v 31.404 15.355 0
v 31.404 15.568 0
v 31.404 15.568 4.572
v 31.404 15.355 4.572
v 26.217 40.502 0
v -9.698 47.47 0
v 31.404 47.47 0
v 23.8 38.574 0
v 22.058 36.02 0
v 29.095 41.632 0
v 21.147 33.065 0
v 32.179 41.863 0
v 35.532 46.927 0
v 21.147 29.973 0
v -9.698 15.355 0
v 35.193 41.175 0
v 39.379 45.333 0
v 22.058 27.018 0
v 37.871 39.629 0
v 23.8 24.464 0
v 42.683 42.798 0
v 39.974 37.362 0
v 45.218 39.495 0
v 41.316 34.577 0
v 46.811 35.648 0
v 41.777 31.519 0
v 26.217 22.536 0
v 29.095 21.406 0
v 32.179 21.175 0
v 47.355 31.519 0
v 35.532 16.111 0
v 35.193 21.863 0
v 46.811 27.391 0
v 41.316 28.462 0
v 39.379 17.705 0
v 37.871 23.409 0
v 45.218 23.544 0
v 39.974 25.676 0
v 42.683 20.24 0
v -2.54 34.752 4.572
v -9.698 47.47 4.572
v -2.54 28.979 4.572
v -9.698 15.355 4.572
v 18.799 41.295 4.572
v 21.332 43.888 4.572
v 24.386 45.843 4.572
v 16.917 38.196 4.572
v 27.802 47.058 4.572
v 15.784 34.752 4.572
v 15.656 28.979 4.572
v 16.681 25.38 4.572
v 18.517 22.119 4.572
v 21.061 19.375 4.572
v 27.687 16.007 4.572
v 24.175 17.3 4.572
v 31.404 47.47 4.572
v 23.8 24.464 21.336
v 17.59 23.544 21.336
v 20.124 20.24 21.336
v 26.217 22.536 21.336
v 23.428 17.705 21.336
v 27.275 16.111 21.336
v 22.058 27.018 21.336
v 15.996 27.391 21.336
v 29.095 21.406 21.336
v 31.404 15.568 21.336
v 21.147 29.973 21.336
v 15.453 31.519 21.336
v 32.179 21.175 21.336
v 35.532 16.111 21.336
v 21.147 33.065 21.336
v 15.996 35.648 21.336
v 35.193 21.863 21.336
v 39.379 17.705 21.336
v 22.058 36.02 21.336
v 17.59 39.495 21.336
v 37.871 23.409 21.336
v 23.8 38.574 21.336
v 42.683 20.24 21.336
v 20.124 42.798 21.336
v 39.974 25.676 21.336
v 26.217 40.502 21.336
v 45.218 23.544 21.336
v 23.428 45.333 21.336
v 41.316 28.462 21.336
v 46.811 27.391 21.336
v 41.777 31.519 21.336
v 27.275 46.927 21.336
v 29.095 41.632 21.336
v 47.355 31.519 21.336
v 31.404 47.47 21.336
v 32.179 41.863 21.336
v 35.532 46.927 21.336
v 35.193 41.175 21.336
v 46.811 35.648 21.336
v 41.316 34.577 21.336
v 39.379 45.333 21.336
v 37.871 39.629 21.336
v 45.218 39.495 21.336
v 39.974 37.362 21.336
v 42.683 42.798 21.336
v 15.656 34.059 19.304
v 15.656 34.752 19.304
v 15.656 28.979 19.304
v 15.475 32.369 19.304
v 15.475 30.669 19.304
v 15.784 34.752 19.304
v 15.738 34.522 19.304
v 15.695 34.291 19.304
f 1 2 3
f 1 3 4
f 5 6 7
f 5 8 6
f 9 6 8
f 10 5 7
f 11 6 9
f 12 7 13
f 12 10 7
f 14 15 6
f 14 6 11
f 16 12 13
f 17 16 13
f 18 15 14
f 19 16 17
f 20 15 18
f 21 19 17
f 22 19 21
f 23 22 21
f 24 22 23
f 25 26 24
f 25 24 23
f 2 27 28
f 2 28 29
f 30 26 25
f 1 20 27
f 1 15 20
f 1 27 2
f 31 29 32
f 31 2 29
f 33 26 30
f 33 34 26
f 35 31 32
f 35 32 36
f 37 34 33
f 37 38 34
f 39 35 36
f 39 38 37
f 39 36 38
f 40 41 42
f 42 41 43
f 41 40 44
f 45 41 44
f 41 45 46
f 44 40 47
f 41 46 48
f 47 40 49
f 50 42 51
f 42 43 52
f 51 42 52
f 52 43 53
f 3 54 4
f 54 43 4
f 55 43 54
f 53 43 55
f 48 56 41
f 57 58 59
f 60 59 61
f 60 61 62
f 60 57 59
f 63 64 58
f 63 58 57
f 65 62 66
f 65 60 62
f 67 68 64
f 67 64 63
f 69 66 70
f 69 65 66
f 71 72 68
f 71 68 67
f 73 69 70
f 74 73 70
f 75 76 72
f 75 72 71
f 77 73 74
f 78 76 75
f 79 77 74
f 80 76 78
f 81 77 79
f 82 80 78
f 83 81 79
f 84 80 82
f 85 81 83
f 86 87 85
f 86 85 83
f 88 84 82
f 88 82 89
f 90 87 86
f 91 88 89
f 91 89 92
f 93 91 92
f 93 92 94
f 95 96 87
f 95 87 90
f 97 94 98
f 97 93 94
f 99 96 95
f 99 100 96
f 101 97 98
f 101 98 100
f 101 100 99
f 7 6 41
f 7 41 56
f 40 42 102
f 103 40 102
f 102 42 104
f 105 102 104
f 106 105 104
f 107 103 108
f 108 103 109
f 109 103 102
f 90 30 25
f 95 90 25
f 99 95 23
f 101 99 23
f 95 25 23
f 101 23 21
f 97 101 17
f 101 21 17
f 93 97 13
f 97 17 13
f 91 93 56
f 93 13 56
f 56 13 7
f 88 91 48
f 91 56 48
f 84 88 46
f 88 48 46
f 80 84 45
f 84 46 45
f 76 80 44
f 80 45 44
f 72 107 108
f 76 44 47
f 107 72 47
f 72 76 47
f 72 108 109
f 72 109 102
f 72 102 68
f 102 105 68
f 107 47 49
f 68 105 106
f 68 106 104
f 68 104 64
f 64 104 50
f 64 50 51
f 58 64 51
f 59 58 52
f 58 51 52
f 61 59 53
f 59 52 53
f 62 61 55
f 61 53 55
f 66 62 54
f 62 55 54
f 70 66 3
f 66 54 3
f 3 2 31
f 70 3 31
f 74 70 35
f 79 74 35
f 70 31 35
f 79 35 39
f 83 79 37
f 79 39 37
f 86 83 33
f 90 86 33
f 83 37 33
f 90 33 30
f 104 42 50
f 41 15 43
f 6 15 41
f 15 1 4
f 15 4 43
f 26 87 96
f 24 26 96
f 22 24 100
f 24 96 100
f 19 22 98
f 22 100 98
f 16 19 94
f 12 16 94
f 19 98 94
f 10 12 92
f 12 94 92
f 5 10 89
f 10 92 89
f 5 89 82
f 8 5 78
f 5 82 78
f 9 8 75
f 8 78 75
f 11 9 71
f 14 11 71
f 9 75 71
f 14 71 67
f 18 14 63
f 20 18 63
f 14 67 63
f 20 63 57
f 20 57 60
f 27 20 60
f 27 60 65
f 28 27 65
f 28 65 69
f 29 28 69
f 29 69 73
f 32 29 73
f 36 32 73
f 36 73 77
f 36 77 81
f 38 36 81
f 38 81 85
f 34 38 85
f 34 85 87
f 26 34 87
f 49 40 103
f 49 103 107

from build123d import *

# Parameters (mm, degrees)
F0_R     = 15.9511244513
F1_DEPTH = 21.336
F4_DEPTH = 4.572
F5_W     = 23.5527278855
F5_H     = 5.7727247477
F6_DEPTH = 19.304
F8_DEPTH = 62.23
F2_R     = 10.3729315348
F9_DEPTH = 46.99


with BuildPart() as f1:
    # F0 (on Top) → F1 (new body)
    with BuildSketch(Plane.XY):
        with Locations((31.4036346972, 31.5190926194)):
            Circle(F0_R)
    extrude(amount=F1_DEPTH)

    # F3 (on face) → F4 (join)
    with BuildSketch(Plane(origin=(0, 0, 0), x_dir=(1, 0, 0), z_dir=(0, 0, -1))):
        with BuildLine():
            Line((-9.6981814131, -47.4702170707), (31.4036346972, -47.4702170707))
            ThreePointArc((31.4036346972, -47.4702170707), (15.4525102459, -31.5190926194), (31.4036346972, -15.5679681681))
            Line((31.4036346972, -15.5679681681), (31.4036346972, -15.3554547578))
            Line((31.4036346972, -15.3554547578), (-9.6981814131, -15.3554547578))
            Line((-9.6981814131, -15.3554547578), (-9.6981814131, -47.4702170707))
        make_face()
    extrude(amount=-F4_DEPTH)

    # F5 (on face) → F6 (join)
    with BuildSketch(Plane(origin=(0, 0, 0), x_dir=(1, 0, 0), z_dir=(0, 0, -1))):
        with Locations((9.2363632284, -31.8654552102)):
            Rectangle(F5_W, F5_H)
    extrude(amount=-F6_DEPTH)

    # F7 (on face) → F8 (cut)
    with BuildSketch(Plane.XZ.offset(-28.9790928364)):
        Polygon((-2.5400007144, 19.304), (-2.5400007144, 4.572), (15.6560389326, 19.304), align=None)
    extrude(amount=-F8_DEPTH, mode=Mode.SUBTRACT)

    # F2 (on face) → F9 (cut)
    with BuildSketch(Plane.XY.offset(21.336)):
        with Locations((31.4036346972, 31.5190926194)):
            Circle(F2_R)
    extrude(amount=-F9_DEPTH, mode=Mode.SUBTRACT)


solid = f1.part
